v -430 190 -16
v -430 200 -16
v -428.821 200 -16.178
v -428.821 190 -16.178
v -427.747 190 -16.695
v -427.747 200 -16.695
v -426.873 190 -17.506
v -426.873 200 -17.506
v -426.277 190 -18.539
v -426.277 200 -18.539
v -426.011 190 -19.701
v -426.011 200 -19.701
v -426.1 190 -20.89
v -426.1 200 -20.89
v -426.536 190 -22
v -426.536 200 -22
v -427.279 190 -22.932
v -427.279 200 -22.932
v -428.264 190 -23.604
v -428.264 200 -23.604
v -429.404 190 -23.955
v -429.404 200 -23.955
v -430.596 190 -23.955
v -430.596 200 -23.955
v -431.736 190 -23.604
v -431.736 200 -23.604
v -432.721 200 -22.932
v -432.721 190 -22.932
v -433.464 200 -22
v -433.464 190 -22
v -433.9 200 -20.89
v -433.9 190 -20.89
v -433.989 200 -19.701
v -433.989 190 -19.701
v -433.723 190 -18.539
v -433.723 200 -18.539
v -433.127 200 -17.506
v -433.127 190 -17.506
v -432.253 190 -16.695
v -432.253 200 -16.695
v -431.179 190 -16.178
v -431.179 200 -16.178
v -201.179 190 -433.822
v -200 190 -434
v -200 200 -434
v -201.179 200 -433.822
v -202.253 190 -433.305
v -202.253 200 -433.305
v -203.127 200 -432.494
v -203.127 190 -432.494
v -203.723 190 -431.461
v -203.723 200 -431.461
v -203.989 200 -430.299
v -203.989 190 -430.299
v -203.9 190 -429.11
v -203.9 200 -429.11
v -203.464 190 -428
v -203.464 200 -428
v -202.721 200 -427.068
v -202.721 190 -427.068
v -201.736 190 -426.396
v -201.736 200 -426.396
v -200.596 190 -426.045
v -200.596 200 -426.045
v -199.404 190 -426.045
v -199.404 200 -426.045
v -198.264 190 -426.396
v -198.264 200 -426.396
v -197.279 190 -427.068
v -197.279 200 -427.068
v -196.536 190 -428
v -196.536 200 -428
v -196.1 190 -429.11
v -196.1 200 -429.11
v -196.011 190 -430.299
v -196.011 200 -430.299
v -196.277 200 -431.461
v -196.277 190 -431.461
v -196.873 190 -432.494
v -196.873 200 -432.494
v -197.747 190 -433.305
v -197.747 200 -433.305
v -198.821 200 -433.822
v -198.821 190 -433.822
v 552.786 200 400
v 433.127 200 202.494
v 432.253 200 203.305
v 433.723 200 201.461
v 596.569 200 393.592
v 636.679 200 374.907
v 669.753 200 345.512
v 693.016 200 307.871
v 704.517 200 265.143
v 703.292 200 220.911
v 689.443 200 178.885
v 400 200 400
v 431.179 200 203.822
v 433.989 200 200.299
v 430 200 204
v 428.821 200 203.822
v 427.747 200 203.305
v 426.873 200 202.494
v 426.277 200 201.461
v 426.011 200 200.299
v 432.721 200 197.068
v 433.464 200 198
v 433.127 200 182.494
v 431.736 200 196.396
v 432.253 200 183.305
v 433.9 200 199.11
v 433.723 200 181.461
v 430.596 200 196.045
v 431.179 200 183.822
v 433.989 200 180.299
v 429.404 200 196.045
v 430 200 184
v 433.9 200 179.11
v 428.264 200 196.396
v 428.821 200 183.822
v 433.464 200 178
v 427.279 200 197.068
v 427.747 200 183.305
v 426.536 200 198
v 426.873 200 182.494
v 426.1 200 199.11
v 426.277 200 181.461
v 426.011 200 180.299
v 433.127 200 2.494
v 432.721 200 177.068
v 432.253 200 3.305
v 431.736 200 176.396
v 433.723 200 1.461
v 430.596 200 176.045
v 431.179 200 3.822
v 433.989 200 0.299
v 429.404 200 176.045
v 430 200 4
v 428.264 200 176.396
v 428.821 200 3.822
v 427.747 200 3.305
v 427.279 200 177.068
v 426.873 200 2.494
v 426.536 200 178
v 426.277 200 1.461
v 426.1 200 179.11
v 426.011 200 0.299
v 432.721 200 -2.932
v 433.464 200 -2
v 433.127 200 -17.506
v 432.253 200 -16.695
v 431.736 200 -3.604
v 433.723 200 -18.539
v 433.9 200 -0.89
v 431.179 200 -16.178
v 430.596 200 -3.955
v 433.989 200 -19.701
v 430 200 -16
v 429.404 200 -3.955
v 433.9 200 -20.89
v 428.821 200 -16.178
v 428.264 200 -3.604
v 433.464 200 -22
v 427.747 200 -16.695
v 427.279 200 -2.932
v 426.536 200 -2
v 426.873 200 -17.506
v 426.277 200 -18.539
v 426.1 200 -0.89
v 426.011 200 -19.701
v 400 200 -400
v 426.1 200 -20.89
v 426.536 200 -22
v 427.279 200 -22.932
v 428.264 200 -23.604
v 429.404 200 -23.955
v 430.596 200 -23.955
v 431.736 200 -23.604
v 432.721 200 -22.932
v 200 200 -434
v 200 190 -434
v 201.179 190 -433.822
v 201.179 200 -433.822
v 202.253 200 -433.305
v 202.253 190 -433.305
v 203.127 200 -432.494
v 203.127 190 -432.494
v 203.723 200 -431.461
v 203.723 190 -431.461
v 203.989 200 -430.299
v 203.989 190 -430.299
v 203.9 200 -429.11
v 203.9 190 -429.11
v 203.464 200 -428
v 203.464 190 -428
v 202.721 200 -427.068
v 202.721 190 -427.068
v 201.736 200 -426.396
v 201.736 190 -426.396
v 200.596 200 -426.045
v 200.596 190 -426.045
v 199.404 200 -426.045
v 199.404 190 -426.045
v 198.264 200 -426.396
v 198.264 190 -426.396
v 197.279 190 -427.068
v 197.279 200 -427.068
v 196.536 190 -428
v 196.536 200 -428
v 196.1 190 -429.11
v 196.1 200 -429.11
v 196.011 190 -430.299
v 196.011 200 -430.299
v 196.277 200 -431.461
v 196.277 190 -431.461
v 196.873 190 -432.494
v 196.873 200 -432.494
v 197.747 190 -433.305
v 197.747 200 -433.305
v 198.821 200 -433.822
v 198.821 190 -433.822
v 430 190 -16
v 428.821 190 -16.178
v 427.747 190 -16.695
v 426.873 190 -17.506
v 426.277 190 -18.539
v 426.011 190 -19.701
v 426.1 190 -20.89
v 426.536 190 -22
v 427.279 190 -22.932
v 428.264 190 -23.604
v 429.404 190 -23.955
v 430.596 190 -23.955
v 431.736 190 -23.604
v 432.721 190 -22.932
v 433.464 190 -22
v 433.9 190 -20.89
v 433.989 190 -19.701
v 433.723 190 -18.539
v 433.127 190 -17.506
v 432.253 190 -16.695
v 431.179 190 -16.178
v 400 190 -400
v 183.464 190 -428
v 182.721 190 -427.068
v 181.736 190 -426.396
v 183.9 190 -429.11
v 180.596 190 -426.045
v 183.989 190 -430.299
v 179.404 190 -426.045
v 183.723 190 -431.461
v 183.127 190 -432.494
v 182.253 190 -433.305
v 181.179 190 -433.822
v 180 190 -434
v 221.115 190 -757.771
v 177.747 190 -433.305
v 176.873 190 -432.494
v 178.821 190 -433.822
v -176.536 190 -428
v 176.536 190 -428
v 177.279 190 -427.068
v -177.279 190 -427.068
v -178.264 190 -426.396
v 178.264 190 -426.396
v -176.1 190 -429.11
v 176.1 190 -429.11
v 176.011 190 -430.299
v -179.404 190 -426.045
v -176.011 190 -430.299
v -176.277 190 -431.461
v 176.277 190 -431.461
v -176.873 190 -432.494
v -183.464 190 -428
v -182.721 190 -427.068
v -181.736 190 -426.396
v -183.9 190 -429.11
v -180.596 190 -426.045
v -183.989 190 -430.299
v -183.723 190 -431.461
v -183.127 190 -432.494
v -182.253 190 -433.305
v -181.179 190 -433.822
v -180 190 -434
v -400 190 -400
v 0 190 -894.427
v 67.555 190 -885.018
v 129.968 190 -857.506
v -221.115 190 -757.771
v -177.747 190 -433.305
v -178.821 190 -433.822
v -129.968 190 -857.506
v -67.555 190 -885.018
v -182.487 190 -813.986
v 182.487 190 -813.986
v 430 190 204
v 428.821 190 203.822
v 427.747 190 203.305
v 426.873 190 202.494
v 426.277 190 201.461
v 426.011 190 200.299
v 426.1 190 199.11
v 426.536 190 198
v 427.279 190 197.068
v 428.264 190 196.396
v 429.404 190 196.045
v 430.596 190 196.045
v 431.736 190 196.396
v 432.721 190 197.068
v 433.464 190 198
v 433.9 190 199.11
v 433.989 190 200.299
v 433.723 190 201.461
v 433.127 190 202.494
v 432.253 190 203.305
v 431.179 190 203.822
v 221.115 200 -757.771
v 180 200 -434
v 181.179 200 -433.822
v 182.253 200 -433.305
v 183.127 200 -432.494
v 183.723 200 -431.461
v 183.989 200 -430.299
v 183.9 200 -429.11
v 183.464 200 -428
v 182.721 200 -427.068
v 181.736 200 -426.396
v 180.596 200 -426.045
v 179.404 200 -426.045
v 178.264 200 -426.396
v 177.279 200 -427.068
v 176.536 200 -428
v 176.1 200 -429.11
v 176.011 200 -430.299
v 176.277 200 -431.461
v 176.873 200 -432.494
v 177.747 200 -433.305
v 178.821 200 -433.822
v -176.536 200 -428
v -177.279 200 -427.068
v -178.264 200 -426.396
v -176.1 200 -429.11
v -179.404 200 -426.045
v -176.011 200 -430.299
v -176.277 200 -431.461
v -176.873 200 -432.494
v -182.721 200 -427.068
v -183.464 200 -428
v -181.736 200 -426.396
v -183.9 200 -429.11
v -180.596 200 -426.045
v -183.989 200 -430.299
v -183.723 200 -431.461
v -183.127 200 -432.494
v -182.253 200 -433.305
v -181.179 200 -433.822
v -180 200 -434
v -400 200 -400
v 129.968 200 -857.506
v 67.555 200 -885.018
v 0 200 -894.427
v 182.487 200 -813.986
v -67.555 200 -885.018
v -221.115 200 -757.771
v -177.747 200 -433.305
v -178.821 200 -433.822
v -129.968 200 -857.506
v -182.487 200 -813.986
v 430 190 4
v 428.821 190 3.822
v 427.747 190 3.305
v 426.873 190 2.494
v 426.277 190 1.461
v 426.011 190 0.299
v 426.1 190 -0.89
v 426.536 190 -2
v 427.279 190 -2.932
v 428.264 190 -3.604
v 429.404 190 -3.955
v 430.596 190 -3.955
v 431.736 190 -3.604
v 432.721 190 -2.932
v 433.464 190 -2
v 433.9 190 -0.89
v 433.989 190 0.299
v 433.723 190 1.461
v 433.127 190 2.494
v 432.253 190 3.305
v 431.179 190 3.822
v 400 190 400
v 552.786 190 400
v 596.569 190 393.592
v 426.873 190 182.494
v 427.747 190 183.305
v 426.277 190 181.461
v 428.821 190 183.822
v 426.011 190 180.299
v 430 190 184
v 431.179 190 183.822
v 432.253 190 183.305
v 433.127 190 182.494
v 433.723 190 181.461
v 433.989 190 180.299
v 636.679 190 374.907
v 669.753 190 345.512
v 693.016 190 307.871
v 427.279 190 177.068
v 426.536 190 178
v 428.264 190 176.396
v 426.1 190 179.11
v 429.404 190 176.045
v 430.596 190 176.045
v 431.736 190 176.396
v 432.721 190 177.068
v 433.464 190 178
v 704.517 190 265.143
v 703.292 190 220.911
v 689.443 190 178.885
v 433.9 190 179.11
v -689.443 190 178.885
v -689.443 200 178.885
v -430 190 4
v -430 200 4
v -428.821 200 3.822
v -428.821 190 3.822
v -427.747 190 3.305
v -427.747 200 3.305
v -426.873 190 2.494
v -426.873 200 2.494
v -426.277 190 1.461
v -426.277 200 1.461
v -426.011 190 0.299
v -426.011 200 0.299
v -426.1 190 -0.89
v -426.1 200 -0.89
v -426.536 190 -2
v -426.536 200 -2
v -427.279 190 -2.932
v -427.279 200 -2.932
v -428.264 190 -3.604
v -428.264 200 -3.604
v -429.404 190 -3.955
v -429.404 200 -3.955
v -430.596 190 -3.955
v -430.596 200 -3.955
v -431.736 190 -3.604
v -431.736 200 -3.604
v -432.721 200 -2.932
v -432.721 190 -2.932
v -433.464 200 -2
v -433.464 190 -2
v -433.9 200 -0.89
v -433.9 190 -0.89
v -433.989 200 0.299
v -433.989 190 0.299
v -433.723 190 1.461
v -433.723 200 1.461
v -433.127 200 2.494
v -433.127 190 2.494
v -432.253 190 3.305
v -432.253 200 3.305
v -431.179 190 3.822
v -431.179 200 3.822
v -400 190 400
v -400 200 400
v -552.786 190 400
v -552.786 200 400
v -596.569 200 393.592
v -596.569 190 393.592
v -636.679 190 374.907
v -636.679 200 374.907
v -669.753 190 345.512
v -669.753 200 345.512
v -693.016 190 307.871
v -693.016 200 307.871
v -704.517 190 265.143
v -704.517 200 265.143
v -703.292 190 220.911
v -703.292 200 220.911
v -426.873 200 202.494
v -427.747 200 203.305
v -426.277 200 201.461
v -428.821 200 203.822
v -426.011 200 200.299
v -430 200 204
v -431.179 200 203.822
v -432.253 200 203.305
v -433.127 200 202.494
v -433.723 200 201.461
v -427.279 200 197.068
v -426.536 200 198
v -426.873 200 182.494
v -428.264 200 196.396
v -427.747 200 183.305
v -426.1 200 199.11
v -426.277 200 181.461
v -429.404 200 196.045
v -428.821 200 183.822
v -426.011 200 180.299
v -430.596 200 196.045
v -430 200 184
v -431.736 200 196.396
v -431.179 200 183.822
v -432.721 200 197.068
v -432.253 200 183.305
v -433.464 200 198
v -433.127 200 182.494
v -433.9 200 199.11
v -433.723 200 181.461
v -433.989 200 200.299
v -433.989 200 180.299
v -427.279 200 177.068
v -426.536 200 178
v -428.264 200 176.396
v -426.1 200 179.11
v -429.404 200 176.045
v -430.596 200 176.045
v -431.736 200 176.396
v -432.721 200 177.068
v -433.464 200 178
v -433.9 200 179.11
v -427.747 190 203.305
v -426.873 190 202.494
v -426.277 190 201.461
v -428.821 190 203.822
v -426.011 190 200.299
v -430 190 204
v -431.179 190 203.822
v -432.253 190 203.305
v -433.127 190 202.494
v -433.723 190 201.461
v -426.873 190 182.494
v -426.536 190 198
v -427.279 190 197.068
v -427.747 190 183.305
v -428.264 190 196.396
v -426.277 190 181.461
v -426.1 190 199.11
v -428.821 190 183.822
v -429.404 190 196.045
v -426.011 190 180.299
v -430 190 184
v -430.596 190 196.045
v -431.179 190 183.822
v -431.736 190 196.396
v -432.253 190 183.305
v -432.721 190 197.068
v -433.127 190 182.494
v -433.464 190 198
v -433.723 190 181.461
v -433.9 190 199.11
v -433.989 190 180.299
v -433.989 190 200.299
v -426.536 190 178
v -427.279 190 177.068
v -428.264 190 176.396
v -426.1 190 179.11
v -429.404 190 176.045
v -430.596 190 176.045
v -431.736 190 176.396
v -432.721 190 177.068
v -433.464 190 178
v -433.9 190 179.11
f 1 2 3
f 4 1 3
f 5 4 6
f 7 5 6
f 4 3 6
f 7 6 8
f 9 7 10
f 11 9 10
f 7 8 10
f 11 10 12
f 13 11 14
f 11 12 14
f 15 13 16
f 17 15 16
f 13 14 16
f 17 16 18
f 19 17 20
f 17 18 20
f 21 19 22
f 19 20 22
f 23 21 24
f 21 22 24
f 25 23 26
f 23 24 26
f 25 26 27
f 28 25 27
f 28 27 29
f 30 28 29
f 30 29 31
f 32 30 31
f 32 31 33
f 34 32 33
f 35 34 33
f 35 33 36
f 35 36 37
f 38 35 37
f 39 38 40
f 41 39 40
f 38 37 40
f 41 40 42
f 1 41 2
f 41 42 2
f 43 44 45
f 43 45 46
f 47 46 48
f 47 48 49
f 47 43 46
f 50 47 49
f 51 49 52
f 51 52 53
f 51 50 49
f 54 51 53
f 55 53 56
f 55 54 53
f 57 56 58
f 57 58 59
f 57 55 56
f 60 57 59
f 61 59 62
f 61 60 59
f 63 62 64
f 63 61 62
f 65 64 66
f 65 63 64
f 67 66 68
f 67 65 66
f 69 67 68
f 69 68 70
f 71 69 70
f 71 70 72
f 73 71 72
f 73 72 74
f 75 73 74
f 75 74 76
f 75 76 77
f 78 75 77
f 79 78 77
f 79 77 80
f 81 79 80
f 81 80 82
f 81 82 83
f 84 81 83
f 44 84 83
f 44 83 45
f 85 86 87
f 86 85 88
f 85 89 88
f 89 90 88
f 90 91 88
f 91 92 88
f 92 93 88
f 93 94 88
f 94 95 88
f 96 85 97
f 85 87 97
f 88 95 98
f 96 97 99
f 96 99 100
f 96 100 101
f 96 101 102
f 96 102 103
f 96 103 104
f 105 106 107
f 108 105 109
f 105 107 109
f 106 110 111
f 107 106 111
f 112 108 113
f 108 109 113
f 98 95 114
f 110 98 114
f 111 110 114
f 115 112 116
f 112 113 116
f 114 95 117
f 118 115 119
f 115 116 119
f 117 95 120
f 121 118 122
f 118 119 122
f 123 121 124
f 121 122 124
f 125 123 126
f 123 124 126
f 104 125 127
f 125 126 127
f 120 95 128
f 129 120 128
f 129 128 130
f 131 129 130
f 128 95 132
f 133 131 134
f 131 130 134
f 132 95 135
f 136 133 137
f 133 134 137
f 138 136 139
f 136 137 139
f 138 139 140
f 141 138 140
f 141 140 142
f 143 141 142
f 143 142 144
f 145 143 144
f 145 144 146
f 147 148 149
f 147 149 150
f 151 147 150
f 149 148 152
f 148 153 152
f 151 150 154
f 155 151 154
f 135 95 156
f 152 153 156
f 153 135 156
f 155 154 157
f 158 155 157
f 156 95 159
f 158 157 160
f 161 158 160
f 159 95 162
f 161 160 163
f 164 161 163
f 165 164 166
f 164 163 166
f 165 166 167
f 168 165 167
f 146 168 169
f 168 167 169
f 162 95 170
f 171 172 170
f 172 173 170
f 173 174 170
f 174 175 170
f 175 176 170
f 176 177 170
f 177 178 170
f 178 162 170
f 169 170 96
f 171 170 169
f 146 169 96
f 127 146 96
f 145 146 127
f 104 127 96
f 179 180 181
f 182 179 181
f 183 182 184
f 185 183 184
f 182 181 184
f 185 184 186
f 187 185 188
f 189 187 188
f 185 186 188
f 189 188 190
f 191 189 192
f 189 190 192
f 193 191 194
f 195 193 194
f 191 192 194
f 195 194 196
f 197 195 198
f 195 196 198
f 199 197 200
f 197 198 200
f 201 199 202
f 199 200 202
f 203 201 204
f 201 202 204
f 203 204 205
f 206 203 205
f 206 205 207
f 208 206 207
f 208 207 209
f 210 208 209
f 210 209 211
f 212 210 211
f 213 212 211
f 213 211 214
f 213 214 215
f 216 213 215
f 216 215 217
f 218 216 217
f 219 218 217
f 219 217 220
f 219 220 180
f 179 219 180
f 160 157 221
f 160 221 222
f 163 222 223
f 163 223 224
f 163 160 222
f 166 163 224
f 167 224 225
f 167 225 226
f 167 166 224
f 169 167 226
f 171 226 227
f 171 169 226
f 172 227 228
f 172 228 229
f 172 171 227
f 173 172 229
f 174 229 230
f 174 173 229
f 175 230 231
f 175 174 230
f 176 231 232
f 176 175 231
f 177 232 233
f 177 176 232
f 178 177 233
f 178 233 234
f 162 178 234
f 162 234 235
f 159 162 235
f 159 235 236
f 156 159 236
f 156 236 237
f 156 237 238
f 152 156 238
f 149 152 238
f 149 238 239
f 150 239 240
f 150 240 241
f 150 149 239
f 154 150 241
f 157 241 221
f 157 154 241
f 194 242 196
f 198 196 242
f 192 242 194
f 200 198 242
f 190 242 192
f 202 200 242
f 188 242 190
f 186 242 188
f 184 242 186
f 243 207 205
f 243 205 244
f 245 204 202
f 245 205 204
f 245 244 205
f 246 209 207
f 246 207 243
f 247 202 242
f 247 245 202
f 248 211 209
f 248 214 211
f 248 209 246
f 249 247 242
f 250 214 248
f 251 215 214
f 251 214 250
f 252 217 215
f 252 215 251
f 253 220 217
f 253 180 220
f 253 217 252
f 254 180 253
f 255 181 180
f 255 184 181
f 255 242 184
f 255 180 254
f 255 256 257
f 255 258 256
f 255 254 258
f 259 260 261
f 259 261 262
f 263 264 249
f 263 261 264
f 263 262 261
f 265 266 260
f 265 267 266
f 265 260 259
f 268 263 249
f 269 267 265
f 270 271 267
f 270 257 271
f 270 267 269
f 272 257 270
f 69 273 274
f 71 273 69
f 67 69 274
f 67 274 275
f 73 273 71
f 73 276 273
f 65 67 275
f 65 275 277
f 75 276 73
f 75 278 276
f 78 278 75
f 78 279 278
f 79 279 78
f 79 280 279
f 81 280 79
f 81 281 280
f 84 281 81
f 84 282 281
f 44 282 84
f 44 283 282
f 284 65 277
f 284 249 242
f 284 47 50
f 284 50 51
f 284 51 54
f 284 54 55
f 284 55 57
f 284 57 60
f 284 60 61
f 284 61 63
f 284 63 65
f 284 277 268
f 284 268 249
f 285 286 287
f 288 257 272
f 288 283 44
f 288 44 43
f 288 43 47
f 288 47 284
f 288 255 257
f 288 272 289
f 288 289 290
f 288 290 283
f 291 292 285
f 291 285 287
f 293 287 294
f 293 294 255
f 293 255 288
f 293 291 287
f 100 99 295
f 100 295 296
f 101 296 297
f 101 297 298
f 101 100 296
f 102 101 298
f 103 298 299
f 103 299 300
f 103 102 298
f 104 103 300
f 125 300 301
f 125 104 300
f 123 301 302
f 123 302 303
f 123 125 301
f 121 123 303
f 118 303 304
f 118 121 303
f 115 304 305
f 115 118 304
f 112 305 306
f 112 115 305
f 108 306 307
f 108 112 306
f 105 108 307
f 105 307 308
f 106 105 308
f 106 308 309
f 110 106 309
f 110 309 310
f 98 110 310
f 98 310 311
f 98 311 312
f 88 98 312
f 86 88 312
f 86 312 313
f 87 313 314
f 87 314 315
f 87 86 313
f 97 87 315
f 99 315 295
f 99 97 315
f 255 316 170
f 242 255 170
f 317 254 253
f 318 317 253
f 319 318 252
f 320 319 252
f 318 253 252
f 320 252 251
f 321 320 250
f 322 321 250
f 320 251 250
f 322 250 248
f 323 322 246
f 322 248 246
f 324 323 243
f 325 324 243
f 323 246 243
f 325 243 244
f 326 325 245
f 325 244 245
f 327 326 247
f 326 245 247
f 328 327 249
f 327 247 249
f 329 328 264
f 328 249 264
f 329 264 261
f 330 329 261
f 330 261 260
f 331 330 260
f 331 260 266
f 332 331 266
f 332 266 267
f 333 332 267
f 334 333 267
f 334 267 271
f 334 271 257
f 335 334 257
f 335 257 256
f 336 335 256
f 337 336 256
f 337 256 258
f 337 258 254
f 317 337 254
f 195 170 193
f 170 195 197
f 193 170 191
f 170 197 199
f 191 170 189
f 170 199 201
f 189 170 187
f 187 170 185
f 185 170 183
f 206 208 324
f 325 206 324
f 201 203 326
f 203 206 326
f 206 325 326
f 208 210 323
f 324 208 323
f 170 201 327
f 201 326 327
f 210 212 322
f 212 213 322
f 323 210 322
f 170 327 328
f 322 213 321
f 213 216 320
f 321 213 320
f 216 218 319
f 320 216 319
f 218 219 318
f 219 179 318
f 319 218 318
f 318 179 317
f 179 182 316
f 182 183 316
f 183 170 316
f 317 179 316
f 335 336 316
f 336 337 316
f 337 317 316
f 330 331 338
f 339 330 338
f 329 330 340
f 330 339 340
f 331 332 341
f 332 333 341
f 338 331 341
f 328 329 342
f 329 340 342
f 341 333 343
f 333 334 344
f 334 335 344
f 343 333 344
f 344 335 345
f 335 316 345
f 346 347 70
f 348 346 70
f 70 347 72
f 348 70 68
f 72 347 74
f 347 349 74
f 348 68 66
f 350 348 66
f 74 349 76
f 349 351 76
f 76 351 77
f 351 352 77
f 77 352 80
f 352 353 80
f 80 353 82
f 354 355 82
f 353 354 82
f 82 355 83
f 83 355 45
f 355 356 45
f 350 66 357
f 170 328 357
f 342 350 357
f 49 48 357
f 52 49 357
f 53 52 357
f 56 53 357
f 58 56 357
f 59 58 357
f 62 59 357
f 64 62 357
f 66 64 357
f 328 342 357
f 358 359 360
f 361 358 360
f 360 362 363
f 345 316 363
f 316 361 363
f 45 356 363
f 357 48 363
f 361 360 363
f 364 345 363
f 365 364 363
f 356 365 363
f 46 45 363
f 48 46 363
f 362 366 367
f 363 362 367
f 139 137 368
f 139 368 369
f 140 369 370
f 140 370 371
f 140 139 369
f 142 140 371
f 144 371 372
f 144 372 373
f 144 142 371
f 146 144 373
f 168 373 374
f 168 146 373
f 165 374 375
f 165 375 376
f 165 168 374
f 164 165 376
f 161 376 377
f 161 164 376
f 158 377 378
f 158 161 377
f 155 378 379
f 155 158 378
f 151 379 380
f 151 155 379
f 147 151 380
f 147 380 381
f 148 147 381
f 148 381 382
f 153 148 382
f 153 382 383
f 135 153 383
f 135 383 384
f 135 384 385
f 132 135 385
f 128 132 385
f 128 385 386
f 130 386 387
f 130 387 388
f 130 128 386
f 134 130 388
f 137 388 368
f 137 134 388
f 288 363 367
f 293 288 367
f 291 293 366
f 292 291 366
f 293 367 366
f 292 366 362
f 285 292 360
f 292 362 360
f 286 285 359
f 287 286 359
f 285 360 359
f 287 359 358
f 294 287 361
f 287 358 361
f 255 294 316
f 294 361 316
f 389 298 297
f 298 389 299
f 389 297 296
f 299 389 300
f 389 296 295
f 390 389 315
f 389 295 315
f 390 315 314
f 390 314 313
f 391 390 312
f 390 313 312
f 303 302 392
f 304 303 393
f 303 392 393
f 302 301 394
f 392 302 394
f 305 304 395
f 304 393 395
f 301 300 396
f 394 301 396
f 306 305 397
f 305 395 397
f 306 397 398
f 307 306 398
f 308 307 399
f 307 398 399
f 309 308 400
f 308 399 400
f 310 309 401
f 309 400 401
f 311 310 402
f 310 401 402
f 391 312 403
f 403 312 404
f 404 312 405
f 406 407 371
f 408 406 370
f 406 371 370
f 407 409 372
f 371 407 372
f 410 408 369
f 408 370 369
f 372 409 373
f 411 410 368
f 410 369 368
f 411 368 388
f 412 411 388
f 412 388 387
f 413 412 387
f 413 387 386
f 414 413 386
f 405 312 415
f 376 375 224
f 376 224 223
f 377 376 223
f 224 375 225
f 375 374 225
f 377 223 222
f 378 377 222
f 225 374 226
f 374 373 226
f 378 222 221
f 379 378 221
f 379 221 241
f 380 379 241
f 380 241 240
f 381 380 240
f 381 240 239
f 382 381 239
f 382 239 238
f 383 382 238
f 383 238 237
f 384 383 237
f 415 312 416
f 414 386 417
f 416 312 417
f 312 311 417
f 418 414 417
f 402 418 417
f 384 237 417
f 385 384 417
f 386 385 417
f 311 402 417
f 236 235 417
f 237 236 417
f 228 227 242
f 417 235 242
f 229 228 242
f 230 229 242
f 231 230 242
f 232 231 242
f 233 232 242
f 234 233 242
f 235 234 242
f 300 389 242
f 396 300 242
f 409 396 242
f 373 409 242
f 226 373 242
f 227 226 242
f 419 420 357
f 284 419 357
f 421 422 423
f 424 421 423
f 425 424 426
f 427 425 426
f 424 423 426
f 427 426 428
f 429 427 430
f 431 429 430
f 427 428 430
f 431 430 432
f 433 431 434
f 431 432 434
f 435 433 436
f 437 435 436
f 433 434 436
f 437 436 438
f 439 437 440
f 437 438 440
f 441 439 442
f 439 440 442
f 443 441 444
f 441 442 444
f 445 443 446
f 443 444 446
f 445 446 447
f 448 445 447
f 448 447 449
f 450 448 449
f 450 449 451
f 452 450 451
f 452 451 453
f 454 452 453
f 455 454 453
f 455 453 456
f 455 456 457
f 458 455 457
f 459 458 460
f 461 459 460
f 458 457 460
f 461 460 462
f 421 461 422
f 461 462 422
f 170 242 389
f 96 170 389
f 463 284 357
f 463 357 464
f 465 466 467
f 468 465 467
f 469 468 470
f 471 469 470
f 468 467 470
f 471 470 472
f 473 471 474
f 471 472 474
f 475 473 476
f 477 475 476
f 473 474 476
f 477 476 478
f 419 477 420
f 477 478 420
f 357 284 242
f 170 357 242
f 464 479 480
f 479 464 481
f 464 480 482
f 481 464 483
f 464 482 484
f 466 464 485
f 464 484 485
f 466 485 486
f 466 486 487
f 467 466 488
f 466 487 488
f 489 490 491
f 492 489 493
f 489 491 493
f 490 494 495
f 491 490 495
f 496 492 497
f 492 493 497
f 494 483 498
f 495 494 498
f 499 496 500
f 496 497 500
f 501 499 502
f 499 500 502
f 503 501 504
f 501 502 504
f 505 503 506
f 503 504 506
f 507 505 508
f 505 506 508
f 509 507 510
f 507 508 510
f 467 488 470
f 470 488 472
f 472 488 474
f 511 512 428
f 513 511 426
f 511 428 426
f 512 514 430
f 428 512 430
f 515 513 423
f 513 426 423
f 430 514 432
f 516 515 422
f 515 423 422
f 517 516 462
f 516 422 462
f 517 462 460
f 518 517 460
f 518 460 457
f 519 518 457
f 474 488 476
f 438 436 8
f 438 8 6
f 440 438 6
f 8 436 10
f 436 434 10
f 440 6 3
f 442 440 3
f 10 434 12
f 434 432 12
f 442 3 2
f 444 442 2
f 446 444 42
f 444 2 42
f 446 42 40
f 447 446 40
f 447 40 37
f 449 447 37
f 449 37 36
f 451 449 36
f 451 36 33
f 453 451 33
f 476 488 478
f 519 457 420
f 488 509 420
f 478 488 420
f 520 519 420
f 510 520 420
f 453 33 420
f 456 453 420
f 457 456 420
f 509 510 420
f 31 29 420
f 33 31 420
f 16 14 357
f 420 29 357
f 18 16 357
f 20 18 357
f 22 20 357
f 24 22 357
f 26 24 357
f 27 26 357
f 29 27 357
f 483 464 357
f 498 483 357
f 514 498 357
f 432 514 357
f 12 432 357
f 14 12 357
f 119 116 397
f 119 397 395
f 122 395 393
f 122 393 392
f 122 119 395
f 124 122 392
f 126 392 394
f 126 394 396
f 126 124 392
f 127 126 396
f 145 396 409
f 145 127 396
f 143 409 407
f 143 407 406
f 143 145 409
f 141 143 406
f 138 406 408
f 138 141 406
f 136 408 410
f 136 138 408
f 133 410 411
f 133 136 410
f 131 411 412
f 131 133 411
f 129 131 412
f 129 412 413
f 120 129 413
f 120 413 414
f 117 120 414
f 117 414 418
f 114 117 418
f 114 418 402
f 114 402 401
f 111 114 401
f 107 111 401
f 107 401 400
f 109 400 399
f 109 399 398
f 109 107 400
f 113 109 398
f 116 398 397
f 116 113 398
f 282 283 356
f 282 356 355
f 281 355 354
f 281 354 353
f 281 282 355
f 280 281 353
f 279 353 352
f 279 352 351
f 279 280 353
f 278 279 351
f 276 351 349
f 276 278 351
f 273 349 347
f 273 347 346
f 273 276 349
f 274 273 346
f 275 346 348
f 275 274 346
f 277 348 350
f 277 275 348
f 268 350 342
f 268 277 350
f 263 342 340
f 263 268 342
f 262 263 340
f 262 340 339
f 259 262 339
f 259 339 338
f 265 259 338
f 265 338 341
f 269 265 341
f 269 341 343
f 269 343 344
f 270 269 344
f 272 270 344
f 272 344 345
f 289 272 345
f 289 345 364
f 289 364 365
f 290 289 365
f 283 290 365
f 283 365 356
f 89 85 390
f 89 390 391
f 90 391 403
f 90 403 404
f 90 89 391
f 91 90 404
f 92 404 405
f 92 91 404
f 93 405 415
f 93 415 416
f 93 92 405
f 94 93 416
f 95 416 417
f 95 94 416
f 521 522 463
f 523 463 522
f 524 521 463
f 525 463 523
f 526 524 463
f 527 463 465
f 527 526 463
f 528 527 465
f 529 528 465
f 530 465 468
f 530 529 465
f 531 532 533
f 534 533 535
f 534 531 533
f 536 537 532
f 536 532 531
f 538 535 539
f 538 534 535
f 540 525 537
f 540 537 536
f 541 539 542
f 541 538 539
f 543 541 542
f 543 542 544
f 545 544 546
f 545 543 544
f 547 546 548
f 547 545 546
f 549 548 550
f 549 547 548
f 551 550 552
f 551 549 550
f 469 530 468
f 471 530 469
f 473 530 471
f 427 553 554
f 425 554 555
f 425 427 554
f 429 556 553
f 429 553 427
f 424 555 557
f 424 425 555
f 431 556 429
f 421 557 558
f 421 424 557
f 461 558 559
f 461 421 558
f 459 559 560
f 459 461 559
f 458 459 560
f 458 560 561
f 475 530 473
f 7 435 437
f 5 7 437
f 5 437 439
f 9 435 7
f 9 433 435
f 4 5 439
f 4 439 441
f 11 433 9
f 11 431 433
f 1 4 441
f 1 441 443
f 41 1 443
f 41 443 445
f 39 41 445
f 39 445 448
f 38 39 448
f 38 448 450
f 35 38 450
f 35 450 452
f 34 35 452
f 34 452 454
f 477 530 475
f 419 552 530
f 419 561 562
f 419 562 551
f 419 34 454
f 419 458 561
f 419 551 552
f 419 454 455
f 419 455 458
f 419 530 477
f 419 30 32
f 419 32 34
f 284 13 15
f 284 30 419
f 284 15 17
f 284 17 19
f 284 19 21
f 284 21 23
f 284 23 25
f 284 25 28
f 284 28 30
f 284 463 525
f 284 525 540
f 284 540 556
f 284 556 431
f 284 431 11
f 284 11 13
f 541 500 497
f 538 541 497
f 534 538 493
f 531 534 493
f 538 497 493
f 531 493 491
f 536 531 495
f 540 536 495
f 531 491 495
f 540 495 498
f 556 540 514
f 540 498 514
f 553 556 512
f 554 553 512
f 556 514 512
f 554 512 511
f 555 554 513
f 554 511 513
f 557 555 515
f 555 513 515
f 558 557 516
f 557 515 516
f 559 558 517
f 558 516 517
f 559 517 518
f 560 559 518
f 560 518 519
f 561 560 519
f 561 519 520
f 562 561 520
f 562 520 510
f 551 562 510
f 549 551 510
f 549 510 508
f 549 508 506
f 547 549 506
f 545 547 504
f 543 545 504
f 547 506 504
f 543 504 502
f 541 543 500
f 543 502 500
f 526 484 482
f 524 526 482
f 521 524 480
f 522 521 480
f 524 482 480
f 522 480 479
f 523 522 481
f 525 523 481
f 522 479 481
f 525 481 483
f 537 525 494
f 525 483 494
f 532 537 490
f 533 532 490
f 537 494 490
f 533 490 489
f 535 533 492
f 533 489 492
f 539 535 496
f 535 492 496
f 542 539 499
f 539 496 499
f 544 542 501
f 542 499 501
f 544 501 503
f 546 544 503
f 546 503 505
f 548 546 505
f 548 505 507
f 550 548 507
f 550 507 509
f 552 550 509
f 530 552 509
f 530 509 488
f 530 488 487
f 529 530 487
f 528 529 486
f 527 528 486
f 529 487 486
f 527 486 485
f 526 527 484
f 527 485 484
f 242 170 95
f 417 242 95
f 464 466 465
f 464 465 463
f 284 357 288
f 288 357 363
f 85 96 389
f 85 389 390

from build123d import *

# Parameters (mm, degrees)
SKETCH_1_W          = 800
SKETCH_1_H          = 800
SKETCH_1_W_2        = 385
SKETCH_1_H_2        = 780
EXTRUDE_1_DEPTH     = 200
SKETCH_2_W          = 800
SKETCH_2_H          = 800
EXTRUDE_2_DEPTH     = 10
EXTRUDE_3_DEPTH     = 10
EXTRUDE_3_2_DEPTH   = 10
SKETCH_4_R          = 4
CUT_EXTRUDE_1_DEPTH = 10
SKETCH_5_R          = 4
CUT_EXTRUDE_2_DEPTH = 10
EXTRUDE_4_DEPTH     = 10
CUT_EXTRUDE_3_REACH = 1087.28
SKETCH_7_R          = 4
CUT_EXTRUDE_4_REACH = 1156.96
SKETCH_8_R          = 4
SKETCH_9_W          = 800
SKETCH_9_H          = 800
CUT_EXTRUDE_5_DEPTH = 1157.647305275


with BuildPart() as part:
    # 草图1 → 凸台-拉伸1 (new body)
    with BuildSketch(Plane(origin=(0, 0, 0), x_dir=(1, 0, 0), z_dir=(0, 1, 0))):
        Rectangle(SKETCH_1_W, SKETCH_1_H)
        with Locations((-197.5, 0)):
            Rectangle(SKETCH_1_W_2, SKETCH_1_H_2, mode=Mode.SUBTRACT)
        with Locations((197.5, 0)):
            Rectangle(SKETCH_1_W_2, SKETCH_1_H_2, mode=Mode.SUBTRACT)
    extrude(amount=EXTRUDE_1_DEPTH)

    # 草图2 → 凸台-拉伸2 (add)
    with BuildSketch(Plane.XZ):
        Rectangle(SKETCH_2_W, SKETCH_2_H)
    extrude(amount=-EXTRUDE_2_DEPTH)

    # 草图4 → 切除-拉伸1 (cut)
    with BuildSketch(Plane.ZY.offset(400)):
        with Locations((180, 160)):
            Circle(SKETCH_4_R)
        with Locations((200, 160)):
            Circle(SKETCH_4_R)
        with Locations((-20, 160)):
            Circle(SKETCH_4_R)
        with Locations((0, 160)):
            Circle(SKETCH_4_R)
    cut_extrude_1 = extrude(amount=-CUT_EXTRUDE_1_DEPTH, mode=Mode.SUBTRACT)


with BuildPart() as body_2:
    # 草图3 → 凸台-拉伸3 (new body)
    with BuildSketch(Plane(origin=(0, 200, 0), x_dir=(1, 0, 0), z_dir=(0, 1, 0))):
        with BuildLine():
            Line((-400, 400), (-400, -400))
            Line((-400, -400), (-552.7864045, -400))
            ThreePointArc((-552.7864045, -400), (-682.754282993, -327.538161854), (-689.4427191, -178.8854382))
            Line((-689.4427191, -178.8854382), (-400, 400))
        make_face()
    extrude(amount=-EXTRUDE_3_DEPTH)

    # 草图5 → 切除-拉伸2 (cut)
    with BuildSketch(Plane(origin=(0, 200, 0), x_dir=(1, 0, 0), z_dir=(0, 1, 0))):
        with Locations(Location((-430, -180, 0), (0, 0, 270))):
            Circle(SKETCH_5_R)
        with Locations(Location((-430, -200, 0), (0, 0, 270))):
            Circle(SKETCH_5_R)
        with Locations(Location((-430, 20, 0), (0, 0, 270))):
            Circle(SKETCH_5_R)
        with Locations(Location((-430, 0, 0), (0, 0, 270))):
            Circle(SKETCH_5_R)
    cut_extrude_2 = extrude(amount=-CUT_EXTRUDE_2_DEPTH, mode=Mode.SUBTRACT)


with BuildPart() as body_3:
    # 草图3 → Extrude 3 2 (new body)
    with BuildSketch(Plane(origin=(0, 200, 0), x_dir=(1, 0, 0), z_dir=(0, 1, 0))):
        with BuildLine():
            Line((689.4427191, -178.8854382), (400, 400))
            Line((400, 400), (400, -400))
            Line((400, -400), (552.7864045, -400))
            ThreePointArc((552.7864045, -400), (682.754282993, -327.538161854), (689.4427191, -178.8854382))
        make_face()
    extrude(amount=-EXTRUDE_3_2_DEPTH)


with BuildPart() as mirror_1_tool:
    # 镜向1: 切除-拉伸1, 切除-拉伸2 across plane
    add(cut_extrude_1.mirror(Plane(origin=(0, 0, 0), x_dir=(0, 0, 1), z_dir=(1, 0, 0))))
    add(cut_extrude_2.mirror(Plane(origin=(0, 0, 0), x_dir=(0, 0, 1), z_dir=(1, 0, 0))))


with BuildPart() as part_1:
    add(part.part)

    # 镜向1: cut by mirror_1_tool
    add(mirror_1_tool.part, mode=Mode.SUBTRACT)


    add(body_2.part)  # 凸台-拉伸4 merges body 2


with BuildPart() as body_3_1:
    add(body_3.part)

    # 镜向1: cut by mirror_1_tool
    add(mirror_1_tool.part, mode=Mode.SUBTRACT)


with BuildPart() as part_2:
    add(part_1.part)

    add(body_3_1.part)  # 凸台-拉伸4 merges body 3
    # 草图6 → 凸台-拉伸4 (add)
    with BuildSketch(Plane(origin=(0, 200, 0), x_dir=(1, 0, 0), z_dir=(0, 1, 0))):
        with BuildLine():
            Line((-400, 400), (-221.1145618, 757.7708764))
            ThreePointArc((-221.1145618, 757.7708764), (0, 894.427191), (221.1145618, 757.7708764))
            Line((221.1145618, 757.7708764), (400, 400))
            Line((400, 400), (-400, 400))
        make_face()
    extrude(amount=-EXTRUDE_4_DEPTH)

    # 草图7 → 切除-拉伸3 (cut, up to next)
    with BuildSketch(Plane(origin=(0, 0, -400), x_dir=(-1, 0, 0), z_dir=(0, 0, -1)), mode=Mode.PRIVATE) as cut_extrude_3_sk1:
        with Locations((-200, 160)):
            Circle(SKETCH_7_R)
    cut_extrude_3_tool1 = extrude(cut_extrude_3_sk1.sketch, amount=-CUT_EXTRUDE_3_REACH, mode=Mode.PRIVATE) & part_2.part
    # 草图7 → 切除-拉伸3 (cut, up to next)
    with BuildSketch(Plane(origin=(0, 0, -400), x_dir=(-1, 0, 0), z_dir=(0, 0, -1)), mode=Mode.PRIVATE) as cut_extrude_3_sk2:
        with Locations((-180, 160)):
            Circle(SKETCH_7_R)
    cut_extrude_3_tool2 = extrude(cut_extrude_3_sk2.sketch, amount=-CUT_EXTRUDE_3_REACH, mode=Mode.PRIVATE) & part_2.part
    cut_extrude_3_1 = cut_extrude_3_tool1.solids().sort_by_distance((200, 160, -400))[0]
    add(cut_extrude_3_1, mode=Mode.SUBTRACT)
    cut_extrude_3_2 = cut_extrude_3_tool2.solids().sort_by_distance((180, 160, -400))[0]
    add(cut_extrude_3_2, mode=Mode.SUBTRACT)
    cut_extrude_3 = cut_extrude_3_1 + cut_extrude_3_2  # 切除-拉伸3 as one shape, for the pattern or mirror that repeats it

    # 草图8 → 切除-拉伸4 (cut, up to next)
    with BuildSketch(Plane.XZ.offset(-190), mode=Mode.PRIVATE) as cut_extrude_4_sk1:
        with Locations(Location((180, -430, 0), (0, 0, 270))):
            Circle(SKETCH_8_R)
    cut_extrude_4_tool1 = extrude(cut_extrude_4_sk1.sketch, amount=-CUT_EXTRUDE_4_REACH, mode=Mode.PRIVATE) & part_2.part
    # 草图8 → 切除-拉伸4 (cut, up to next)
    with BuildSketch(Plane.XZ.offset(-190), mode=Mode.PRIVATE) as cut_extrude_4_sk2:
        with Locations(Location((200, -430, 0), (0, 0, 270))):
            Circle(SKETCH_8_R)
    cut_extrude_4_tool2 = extrude(cut_extrude_4_sk2.sketch, amount=-CUT_EXTRUDE_4_REACH, mode=Mode.PRIVATE) & part_2.part
    cut_extrude_4_1 = cut_extrude_4_tool1.solids().sort_by_distance((180, 190, -430))[0]
    add(cut_extrude_4_1, mode=Mode.SUBTRACT)
    cut_extrude_4_2 = cut_extrude_4_tool2.solids().sort_by_distance((200, 190, -430))[0]
    add(cut_extrude_4_2, mode=Mode.SUBTRACT)
    cut_extrude_4 = cut_extrude_4_1 + cut_extrude_4_2  # 切除-拉伸4 as one shape, for the pattern or mirror that repeats it

    # 镜向2: 切除-拉伸3, 切除-拉伸4 across plane
    add(cut_extrude_3.mirror(Plane(origin=(0, 0, 0), x_dir=(0, 0, 1), z_dir=(1, 0, 0))), mode=Mode.SUBTRACT)
    add(cut_extrude_4.mirror(Plane(origin=(0, 0, 0), x_dir=(0, 0, 1), z_dir=(1, 0, 0))), mode=Mode.SUBTRACT)

    # 草图9 → 切除-拉伸5 (cut, through all)
    with BuildSketch(Plane.XZ):
        Rectangle(SKETCH_9_W, SKETCH_9_H)
    extrude(amount=-CUT_EXTRUDE_5_DEPTH, mode=Mode.SUBTRACT)


with BuildPart() as cut_extrude_5_piece_1:
    # of the separate pieces the step leaves, piece 1, a body of its own (cut_extrude_5_pieces)
    add(part_2.part.solids().sort_by_distance((221.1145618, 190, -757.7708764))[0])


with BuildPart() as cut_extrude_5_piece_2:
    # of the separate pieces the step leaves, piece 2, a body of its own (cut_extrude_5_pieces)
    add(part_2.part.solids().sort_by_distance((-689.4427191, 190, 178.8854382))[0])


with BuildPart() as cut_extrude_5_piece_3:
    # of the separate pieces the step leaves, piece 3, a body of its own (cut_extrude_5_pieces)
    add(part_2.part.solids().sort_by_distance((552.7864045, 190, 400))[0])


solid = Compound([cut_extrude_5_piece_1.part, cut_extrude_5_piece_2.part, cut_extrude_5_piece_3.part])
